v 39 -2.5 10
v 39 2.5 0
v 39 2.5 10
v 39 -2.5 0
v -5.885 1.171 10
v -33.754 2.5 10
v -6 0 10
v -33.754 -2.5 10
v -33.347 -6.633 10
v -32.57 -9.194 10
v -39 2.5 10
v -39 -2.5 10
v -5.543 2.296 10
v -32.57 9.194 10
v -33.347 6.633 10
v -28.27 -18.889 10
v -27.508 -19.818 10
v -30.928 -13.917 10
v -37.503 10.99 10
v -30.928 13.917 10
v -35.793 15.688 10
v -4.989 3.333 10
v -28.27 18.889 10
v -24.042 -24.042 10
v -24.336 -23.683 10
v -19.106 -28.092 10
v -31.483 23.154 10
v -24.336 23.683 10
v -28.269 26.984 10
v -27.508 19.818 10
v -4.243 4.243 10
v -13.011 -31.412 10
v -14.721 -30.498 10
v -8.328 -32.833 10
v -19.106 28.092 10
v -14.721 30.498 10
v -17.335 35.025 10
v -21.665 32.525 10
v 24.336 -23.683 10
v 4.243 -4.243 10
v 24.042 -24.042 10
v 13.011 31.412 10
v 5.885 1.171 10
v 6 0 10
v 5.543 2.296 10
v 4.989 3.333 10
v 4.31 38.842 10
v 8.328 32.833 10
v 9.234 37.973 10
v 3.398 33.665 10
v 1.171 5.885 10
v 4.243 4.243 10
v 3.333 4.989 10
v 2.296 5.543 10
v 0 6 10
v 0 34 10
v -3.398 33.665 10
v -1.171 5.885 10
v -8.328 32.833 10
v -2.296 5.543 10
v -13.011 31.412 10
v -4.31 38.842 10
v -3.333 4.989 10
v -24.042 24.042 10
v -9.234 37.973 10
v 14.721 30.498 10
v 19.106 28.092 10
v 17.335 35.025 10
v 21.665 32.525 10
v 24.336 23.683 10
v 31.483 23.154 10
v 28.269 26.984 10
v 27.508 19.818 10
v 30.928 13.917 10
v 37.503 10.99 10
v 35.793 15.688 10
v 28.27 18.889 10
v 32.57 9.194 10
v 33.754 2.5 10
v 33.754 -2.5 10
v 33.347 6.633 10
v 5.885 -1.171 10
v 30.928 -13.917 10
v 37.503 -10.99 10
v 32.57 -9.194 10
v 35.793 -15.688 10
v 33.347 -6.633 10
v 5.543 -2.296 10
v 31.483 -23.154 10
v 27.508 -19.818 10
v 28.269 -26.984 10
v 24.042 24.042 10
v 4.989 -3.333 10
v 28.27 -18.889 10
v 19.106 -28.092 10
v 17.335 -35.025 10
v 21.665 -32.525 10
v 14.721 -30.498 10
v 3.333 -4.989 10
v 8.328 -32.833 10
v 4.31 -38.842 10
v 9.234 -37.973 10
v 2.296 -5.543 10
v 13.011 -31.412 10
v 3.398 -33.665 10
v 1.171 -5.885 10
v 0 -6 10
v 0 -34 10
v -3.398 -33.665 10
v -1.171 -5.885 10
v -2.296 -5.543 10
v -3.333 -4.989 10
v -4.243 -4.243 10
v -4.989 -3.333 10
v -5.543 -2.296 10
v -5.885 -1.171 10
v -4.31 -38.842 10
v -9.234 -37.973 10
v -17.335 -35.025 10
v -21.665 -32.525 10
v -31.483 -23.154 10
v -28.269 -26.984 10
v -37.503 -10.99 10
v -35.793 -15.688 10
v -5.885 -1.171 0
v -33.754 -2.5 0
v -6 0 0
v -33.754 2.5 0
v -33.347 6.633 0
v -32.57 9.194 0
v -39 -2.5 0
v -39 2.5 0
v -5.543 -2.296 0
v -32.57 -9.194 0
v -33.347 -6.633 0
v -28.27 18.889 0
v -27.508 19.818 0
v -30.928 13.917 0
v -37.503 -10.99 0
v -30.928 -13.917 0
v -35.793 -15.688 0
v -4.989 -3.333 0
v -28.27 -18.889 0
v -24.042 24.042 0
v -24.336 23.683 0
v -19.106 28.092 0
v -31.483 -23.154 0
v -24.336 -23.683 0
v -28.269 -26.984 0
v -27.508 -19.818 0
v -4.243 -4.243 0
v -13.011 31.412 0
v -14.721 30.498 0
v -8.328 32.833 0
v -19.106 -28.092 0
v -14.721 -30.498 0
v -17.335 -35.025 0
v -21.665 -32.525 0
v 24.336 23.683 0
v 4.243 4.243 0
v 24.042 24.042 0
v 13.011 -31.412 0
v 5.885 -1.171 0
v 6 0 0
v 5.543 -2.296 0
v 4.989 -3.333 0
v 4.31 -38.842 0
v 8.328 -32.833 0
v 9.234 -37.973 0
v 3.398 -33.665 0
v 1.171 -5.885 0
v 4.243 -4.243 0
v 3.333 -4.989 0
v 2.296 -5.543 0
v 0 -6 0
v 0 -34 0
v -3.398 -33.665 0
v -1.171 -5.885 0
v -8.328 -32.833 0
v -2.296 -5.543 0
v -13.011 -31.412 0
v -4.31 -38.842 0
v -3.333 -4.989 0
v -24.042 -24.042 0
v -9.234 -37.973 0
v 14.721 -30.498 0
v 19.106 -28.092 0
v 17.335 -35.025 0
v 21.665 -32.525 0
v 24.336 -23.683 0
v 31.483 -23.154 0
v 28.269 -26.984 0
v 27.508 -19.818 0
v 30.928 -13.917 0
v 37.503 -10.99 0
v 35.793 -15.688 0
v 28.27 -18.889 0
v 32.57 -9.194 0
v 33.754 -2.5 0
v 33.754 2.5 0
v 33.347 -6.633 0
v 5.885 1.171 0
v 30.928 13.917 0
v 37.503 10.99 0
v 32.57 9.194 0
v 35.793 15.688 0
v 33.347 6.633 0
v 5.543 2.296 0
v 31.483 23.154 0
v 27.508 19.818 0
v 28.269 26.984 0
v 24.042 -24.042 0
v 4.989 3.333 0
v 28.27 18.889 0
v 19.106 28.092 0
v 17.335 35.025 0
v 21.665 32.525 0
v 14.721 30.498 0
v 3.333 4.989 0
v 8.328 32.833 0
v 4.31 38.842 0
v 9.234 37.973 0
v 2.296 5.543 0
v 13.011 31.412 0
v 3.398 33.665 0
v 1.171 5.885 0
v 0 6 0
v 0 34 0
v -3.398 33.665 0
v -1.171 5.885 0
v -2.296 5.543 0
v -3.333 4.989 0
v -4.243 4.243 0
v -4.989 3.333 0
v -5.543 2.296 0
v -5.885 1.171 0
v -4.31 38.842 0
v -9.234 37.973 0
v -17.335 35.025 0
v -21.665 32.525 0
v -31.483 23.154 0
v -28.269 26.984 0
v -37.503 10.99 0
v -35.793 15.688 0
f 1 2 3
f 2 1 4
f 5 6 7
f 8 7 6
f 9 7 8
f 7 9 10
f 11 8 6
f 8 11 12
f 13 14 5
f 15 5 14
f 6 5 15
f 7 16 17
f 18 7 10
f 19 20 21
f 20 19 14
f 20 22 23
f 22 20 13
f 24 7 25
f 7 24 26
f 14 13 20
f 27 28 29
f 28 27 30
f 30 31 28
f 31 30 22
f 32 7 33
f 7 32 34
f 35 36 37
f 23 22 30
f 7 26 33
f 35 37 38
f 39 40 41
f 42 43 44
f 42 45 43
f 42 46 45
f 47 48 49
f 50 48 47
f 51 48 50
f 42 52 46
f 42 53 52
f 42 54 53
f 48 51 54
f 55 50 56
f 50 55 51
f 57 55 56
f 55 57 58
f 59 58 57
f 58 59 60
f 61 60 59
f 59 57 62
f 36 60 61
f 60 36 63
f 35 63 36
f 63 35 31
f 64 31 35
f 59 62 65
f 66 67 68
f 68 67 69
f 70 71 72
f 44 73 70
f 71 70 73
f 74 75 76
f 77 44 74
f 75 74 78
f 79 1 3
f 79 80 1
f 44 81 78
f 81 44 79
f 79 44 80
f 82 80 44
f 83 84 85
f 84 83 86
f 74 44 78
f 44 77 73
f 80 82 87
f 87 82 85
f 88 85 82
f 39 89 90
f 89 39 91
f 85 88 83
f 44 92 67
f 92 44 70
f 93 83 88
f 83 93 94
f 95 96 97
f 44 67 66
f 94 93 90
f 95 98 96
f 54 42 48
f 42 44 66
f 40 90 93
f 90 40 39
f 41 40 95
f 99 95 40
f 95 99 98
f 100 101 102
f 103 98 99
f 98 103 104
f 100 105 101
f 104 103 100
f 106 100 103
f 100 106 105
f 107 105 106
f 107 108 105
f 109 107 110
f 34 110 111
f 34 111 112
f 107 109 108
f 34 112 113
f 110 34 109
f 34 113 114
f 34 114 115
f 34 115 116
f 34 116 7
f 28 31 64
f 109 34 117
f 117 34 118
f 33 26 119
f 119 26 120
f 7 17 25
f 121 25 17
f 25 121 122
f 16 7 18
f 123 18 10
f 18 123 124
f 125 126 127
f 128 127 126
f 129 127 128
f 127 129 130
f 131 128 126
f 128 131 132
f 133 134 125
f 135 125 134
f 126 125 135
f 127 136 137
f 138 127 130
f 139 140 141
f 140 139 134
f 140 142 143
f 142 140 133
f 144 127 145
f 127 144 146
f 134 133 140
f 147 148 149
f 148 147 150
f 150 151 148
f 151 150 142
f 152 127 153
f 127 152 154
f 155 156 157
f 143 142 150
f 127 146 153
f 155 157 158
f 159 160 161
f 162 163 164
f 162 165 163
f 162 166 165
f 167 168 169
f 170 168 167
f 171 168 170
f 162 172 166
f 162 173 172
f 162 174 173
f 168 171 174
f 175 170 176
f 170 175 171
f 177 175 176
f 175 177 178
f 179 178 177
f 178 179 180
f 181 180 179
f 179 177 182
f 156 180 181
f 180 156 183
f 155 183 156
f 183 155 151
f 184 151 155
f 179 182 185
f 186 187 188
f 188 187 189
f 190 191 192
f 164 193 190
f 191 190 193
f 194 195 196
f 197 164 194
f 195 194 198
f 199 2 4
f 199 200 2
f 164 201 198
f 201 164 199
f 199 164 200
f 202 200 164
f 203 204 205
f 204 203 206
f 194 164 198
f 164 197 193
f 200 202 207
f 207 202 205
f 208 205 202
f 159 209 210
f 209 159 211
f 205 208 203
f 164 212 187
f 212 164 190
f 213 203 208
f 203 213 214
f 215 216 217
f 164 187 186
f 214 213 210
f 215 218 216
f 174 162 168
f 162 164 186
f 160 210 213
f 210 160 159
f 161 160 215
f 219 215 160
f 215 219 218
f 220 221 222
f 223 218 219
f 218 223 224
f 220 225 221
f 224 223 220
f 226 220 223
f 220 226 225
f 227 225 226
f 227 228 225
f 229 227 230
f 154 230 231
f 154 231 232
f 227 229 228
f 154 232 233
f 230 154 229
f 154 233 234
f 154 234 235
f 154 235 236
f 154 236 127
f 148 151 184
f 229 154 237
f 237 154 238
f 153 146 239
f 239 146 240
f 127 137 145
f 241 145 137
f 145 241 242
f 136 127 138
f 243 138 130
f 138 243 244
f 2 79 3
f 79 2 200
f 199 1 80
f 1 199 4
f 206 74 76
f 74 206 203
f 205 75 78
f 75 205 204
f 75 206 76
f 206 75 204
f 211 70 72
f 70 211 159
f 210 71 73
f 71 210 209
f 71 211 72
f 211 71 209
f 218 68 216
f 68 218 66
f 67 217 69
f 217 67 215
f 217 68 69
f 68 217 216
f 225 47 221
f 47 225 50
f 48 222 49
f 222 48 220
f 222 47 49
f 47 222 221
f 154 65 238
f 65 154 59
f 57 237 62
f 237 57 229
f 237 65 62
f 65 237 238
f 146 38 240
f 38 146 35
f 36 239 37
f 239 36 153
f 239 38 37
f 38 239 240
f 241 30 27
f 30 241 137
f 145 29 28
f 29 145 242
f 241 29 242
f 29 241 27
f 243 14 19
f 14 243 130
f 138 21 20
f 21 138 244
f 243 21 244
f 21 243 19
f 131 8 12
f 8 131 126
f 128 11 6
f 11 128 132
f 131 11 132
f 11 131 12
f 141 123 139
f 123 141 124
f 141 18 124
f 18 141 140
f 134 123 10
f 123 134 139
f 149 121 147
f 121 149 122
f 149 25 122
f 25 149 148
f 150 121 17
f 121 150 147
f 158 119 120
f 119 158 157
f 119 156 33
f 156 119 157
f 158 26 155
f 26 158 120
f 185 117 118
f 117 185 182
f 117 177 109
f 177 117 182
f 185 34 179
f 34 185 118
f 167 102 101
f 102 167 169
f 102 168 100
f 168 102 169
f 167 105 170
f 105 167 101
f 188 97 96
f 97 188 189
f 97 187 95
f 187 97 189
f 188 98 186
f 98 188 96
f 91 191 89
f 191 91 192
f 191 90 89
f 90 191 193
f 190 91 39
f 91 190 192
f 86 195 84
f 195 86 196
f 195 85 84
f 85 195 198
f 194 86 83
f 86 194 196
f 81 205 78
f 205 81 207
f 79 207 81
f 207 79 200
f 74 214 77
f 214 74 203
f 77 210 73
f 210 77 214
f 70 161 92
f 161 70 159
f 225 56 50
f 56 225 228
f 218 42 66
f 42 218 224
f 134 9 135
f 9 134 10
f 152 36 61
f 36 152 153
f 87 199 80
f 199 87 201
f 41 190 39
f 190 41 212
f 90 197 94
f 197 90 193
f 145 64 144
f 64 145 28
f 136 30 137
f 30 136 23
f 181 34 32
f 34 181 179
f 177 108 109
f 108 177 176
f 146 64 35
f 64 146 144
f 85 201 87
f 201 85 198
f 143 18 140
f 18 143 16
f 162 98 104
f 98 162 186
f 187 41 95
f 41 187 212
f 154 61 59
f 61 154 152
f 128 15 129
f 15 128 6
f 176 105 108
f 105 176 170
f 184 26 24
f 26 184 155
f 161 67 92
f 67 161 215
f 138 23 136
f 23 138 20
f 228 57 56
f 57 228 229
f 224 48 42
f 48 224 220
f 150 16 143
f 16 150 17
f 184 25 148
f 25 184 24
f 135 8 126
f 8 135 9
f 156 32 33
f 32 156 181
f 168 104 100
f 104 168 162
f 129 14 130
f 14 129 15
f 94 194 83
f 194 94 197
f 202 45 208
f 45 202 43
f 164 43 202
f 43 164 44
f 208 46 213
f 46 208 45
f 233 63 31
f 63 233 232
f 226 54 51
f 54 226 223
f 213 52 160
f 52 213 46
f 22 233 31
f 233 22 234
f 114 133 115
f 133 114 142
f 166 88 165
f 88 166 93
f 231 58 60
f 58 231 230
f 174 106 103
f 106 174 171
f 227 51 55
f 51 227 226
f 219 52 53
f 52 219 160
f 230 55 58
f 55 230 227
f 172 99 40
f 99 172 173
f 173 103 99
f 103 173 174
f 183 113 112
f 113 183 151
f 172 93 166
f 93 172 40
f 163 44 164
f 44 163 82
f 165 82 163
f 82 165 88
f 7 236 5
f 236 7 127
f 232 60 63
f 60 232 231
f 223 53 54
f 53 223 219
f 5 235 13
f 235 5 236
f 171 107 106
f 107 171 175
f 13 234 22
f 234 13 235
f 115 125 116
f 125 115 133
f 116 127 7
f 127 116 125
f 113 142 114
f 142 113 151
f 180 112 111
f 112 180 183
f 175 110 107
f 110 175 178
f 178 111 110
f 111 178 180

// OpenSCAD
$fn = 32;

// ----------------------------------------------------------------------
// Spur blank: bored gear blank
// ----------------------------------------------------------------------

// --- parameters (mm) ---
disc_r = 34;              // blank root radius
disc_t = 10;              // blank thickness
n_teeth = 18;             // stub tooth count
tooth_w = 5;              // tooth width at the root
tooth_h = 5;              // tooth height above the root
bore_r = 6;               // central bore radius

out_r = disc_r + tooth_h;  // tip radius
bbox_x = 78.0;  // measured width over the teeth
bbox_y = 77.68;  // measured depth over the teeth

difference() {
union() {
  cylinder(r = disc_r, h = disc_t);
  for (i = [0 : n_teeth - 1])
    rotate([0, 0, i * 360 / n_teeth])
      translate([disc_r - 1, -tooth_w / 2, 0])
        cube([tooth_h + 1, tooth_w, disc_t]);
}
  translate([0, 0, -1]) cylinder(r = bore_r, h = disc_t + 2);
}
